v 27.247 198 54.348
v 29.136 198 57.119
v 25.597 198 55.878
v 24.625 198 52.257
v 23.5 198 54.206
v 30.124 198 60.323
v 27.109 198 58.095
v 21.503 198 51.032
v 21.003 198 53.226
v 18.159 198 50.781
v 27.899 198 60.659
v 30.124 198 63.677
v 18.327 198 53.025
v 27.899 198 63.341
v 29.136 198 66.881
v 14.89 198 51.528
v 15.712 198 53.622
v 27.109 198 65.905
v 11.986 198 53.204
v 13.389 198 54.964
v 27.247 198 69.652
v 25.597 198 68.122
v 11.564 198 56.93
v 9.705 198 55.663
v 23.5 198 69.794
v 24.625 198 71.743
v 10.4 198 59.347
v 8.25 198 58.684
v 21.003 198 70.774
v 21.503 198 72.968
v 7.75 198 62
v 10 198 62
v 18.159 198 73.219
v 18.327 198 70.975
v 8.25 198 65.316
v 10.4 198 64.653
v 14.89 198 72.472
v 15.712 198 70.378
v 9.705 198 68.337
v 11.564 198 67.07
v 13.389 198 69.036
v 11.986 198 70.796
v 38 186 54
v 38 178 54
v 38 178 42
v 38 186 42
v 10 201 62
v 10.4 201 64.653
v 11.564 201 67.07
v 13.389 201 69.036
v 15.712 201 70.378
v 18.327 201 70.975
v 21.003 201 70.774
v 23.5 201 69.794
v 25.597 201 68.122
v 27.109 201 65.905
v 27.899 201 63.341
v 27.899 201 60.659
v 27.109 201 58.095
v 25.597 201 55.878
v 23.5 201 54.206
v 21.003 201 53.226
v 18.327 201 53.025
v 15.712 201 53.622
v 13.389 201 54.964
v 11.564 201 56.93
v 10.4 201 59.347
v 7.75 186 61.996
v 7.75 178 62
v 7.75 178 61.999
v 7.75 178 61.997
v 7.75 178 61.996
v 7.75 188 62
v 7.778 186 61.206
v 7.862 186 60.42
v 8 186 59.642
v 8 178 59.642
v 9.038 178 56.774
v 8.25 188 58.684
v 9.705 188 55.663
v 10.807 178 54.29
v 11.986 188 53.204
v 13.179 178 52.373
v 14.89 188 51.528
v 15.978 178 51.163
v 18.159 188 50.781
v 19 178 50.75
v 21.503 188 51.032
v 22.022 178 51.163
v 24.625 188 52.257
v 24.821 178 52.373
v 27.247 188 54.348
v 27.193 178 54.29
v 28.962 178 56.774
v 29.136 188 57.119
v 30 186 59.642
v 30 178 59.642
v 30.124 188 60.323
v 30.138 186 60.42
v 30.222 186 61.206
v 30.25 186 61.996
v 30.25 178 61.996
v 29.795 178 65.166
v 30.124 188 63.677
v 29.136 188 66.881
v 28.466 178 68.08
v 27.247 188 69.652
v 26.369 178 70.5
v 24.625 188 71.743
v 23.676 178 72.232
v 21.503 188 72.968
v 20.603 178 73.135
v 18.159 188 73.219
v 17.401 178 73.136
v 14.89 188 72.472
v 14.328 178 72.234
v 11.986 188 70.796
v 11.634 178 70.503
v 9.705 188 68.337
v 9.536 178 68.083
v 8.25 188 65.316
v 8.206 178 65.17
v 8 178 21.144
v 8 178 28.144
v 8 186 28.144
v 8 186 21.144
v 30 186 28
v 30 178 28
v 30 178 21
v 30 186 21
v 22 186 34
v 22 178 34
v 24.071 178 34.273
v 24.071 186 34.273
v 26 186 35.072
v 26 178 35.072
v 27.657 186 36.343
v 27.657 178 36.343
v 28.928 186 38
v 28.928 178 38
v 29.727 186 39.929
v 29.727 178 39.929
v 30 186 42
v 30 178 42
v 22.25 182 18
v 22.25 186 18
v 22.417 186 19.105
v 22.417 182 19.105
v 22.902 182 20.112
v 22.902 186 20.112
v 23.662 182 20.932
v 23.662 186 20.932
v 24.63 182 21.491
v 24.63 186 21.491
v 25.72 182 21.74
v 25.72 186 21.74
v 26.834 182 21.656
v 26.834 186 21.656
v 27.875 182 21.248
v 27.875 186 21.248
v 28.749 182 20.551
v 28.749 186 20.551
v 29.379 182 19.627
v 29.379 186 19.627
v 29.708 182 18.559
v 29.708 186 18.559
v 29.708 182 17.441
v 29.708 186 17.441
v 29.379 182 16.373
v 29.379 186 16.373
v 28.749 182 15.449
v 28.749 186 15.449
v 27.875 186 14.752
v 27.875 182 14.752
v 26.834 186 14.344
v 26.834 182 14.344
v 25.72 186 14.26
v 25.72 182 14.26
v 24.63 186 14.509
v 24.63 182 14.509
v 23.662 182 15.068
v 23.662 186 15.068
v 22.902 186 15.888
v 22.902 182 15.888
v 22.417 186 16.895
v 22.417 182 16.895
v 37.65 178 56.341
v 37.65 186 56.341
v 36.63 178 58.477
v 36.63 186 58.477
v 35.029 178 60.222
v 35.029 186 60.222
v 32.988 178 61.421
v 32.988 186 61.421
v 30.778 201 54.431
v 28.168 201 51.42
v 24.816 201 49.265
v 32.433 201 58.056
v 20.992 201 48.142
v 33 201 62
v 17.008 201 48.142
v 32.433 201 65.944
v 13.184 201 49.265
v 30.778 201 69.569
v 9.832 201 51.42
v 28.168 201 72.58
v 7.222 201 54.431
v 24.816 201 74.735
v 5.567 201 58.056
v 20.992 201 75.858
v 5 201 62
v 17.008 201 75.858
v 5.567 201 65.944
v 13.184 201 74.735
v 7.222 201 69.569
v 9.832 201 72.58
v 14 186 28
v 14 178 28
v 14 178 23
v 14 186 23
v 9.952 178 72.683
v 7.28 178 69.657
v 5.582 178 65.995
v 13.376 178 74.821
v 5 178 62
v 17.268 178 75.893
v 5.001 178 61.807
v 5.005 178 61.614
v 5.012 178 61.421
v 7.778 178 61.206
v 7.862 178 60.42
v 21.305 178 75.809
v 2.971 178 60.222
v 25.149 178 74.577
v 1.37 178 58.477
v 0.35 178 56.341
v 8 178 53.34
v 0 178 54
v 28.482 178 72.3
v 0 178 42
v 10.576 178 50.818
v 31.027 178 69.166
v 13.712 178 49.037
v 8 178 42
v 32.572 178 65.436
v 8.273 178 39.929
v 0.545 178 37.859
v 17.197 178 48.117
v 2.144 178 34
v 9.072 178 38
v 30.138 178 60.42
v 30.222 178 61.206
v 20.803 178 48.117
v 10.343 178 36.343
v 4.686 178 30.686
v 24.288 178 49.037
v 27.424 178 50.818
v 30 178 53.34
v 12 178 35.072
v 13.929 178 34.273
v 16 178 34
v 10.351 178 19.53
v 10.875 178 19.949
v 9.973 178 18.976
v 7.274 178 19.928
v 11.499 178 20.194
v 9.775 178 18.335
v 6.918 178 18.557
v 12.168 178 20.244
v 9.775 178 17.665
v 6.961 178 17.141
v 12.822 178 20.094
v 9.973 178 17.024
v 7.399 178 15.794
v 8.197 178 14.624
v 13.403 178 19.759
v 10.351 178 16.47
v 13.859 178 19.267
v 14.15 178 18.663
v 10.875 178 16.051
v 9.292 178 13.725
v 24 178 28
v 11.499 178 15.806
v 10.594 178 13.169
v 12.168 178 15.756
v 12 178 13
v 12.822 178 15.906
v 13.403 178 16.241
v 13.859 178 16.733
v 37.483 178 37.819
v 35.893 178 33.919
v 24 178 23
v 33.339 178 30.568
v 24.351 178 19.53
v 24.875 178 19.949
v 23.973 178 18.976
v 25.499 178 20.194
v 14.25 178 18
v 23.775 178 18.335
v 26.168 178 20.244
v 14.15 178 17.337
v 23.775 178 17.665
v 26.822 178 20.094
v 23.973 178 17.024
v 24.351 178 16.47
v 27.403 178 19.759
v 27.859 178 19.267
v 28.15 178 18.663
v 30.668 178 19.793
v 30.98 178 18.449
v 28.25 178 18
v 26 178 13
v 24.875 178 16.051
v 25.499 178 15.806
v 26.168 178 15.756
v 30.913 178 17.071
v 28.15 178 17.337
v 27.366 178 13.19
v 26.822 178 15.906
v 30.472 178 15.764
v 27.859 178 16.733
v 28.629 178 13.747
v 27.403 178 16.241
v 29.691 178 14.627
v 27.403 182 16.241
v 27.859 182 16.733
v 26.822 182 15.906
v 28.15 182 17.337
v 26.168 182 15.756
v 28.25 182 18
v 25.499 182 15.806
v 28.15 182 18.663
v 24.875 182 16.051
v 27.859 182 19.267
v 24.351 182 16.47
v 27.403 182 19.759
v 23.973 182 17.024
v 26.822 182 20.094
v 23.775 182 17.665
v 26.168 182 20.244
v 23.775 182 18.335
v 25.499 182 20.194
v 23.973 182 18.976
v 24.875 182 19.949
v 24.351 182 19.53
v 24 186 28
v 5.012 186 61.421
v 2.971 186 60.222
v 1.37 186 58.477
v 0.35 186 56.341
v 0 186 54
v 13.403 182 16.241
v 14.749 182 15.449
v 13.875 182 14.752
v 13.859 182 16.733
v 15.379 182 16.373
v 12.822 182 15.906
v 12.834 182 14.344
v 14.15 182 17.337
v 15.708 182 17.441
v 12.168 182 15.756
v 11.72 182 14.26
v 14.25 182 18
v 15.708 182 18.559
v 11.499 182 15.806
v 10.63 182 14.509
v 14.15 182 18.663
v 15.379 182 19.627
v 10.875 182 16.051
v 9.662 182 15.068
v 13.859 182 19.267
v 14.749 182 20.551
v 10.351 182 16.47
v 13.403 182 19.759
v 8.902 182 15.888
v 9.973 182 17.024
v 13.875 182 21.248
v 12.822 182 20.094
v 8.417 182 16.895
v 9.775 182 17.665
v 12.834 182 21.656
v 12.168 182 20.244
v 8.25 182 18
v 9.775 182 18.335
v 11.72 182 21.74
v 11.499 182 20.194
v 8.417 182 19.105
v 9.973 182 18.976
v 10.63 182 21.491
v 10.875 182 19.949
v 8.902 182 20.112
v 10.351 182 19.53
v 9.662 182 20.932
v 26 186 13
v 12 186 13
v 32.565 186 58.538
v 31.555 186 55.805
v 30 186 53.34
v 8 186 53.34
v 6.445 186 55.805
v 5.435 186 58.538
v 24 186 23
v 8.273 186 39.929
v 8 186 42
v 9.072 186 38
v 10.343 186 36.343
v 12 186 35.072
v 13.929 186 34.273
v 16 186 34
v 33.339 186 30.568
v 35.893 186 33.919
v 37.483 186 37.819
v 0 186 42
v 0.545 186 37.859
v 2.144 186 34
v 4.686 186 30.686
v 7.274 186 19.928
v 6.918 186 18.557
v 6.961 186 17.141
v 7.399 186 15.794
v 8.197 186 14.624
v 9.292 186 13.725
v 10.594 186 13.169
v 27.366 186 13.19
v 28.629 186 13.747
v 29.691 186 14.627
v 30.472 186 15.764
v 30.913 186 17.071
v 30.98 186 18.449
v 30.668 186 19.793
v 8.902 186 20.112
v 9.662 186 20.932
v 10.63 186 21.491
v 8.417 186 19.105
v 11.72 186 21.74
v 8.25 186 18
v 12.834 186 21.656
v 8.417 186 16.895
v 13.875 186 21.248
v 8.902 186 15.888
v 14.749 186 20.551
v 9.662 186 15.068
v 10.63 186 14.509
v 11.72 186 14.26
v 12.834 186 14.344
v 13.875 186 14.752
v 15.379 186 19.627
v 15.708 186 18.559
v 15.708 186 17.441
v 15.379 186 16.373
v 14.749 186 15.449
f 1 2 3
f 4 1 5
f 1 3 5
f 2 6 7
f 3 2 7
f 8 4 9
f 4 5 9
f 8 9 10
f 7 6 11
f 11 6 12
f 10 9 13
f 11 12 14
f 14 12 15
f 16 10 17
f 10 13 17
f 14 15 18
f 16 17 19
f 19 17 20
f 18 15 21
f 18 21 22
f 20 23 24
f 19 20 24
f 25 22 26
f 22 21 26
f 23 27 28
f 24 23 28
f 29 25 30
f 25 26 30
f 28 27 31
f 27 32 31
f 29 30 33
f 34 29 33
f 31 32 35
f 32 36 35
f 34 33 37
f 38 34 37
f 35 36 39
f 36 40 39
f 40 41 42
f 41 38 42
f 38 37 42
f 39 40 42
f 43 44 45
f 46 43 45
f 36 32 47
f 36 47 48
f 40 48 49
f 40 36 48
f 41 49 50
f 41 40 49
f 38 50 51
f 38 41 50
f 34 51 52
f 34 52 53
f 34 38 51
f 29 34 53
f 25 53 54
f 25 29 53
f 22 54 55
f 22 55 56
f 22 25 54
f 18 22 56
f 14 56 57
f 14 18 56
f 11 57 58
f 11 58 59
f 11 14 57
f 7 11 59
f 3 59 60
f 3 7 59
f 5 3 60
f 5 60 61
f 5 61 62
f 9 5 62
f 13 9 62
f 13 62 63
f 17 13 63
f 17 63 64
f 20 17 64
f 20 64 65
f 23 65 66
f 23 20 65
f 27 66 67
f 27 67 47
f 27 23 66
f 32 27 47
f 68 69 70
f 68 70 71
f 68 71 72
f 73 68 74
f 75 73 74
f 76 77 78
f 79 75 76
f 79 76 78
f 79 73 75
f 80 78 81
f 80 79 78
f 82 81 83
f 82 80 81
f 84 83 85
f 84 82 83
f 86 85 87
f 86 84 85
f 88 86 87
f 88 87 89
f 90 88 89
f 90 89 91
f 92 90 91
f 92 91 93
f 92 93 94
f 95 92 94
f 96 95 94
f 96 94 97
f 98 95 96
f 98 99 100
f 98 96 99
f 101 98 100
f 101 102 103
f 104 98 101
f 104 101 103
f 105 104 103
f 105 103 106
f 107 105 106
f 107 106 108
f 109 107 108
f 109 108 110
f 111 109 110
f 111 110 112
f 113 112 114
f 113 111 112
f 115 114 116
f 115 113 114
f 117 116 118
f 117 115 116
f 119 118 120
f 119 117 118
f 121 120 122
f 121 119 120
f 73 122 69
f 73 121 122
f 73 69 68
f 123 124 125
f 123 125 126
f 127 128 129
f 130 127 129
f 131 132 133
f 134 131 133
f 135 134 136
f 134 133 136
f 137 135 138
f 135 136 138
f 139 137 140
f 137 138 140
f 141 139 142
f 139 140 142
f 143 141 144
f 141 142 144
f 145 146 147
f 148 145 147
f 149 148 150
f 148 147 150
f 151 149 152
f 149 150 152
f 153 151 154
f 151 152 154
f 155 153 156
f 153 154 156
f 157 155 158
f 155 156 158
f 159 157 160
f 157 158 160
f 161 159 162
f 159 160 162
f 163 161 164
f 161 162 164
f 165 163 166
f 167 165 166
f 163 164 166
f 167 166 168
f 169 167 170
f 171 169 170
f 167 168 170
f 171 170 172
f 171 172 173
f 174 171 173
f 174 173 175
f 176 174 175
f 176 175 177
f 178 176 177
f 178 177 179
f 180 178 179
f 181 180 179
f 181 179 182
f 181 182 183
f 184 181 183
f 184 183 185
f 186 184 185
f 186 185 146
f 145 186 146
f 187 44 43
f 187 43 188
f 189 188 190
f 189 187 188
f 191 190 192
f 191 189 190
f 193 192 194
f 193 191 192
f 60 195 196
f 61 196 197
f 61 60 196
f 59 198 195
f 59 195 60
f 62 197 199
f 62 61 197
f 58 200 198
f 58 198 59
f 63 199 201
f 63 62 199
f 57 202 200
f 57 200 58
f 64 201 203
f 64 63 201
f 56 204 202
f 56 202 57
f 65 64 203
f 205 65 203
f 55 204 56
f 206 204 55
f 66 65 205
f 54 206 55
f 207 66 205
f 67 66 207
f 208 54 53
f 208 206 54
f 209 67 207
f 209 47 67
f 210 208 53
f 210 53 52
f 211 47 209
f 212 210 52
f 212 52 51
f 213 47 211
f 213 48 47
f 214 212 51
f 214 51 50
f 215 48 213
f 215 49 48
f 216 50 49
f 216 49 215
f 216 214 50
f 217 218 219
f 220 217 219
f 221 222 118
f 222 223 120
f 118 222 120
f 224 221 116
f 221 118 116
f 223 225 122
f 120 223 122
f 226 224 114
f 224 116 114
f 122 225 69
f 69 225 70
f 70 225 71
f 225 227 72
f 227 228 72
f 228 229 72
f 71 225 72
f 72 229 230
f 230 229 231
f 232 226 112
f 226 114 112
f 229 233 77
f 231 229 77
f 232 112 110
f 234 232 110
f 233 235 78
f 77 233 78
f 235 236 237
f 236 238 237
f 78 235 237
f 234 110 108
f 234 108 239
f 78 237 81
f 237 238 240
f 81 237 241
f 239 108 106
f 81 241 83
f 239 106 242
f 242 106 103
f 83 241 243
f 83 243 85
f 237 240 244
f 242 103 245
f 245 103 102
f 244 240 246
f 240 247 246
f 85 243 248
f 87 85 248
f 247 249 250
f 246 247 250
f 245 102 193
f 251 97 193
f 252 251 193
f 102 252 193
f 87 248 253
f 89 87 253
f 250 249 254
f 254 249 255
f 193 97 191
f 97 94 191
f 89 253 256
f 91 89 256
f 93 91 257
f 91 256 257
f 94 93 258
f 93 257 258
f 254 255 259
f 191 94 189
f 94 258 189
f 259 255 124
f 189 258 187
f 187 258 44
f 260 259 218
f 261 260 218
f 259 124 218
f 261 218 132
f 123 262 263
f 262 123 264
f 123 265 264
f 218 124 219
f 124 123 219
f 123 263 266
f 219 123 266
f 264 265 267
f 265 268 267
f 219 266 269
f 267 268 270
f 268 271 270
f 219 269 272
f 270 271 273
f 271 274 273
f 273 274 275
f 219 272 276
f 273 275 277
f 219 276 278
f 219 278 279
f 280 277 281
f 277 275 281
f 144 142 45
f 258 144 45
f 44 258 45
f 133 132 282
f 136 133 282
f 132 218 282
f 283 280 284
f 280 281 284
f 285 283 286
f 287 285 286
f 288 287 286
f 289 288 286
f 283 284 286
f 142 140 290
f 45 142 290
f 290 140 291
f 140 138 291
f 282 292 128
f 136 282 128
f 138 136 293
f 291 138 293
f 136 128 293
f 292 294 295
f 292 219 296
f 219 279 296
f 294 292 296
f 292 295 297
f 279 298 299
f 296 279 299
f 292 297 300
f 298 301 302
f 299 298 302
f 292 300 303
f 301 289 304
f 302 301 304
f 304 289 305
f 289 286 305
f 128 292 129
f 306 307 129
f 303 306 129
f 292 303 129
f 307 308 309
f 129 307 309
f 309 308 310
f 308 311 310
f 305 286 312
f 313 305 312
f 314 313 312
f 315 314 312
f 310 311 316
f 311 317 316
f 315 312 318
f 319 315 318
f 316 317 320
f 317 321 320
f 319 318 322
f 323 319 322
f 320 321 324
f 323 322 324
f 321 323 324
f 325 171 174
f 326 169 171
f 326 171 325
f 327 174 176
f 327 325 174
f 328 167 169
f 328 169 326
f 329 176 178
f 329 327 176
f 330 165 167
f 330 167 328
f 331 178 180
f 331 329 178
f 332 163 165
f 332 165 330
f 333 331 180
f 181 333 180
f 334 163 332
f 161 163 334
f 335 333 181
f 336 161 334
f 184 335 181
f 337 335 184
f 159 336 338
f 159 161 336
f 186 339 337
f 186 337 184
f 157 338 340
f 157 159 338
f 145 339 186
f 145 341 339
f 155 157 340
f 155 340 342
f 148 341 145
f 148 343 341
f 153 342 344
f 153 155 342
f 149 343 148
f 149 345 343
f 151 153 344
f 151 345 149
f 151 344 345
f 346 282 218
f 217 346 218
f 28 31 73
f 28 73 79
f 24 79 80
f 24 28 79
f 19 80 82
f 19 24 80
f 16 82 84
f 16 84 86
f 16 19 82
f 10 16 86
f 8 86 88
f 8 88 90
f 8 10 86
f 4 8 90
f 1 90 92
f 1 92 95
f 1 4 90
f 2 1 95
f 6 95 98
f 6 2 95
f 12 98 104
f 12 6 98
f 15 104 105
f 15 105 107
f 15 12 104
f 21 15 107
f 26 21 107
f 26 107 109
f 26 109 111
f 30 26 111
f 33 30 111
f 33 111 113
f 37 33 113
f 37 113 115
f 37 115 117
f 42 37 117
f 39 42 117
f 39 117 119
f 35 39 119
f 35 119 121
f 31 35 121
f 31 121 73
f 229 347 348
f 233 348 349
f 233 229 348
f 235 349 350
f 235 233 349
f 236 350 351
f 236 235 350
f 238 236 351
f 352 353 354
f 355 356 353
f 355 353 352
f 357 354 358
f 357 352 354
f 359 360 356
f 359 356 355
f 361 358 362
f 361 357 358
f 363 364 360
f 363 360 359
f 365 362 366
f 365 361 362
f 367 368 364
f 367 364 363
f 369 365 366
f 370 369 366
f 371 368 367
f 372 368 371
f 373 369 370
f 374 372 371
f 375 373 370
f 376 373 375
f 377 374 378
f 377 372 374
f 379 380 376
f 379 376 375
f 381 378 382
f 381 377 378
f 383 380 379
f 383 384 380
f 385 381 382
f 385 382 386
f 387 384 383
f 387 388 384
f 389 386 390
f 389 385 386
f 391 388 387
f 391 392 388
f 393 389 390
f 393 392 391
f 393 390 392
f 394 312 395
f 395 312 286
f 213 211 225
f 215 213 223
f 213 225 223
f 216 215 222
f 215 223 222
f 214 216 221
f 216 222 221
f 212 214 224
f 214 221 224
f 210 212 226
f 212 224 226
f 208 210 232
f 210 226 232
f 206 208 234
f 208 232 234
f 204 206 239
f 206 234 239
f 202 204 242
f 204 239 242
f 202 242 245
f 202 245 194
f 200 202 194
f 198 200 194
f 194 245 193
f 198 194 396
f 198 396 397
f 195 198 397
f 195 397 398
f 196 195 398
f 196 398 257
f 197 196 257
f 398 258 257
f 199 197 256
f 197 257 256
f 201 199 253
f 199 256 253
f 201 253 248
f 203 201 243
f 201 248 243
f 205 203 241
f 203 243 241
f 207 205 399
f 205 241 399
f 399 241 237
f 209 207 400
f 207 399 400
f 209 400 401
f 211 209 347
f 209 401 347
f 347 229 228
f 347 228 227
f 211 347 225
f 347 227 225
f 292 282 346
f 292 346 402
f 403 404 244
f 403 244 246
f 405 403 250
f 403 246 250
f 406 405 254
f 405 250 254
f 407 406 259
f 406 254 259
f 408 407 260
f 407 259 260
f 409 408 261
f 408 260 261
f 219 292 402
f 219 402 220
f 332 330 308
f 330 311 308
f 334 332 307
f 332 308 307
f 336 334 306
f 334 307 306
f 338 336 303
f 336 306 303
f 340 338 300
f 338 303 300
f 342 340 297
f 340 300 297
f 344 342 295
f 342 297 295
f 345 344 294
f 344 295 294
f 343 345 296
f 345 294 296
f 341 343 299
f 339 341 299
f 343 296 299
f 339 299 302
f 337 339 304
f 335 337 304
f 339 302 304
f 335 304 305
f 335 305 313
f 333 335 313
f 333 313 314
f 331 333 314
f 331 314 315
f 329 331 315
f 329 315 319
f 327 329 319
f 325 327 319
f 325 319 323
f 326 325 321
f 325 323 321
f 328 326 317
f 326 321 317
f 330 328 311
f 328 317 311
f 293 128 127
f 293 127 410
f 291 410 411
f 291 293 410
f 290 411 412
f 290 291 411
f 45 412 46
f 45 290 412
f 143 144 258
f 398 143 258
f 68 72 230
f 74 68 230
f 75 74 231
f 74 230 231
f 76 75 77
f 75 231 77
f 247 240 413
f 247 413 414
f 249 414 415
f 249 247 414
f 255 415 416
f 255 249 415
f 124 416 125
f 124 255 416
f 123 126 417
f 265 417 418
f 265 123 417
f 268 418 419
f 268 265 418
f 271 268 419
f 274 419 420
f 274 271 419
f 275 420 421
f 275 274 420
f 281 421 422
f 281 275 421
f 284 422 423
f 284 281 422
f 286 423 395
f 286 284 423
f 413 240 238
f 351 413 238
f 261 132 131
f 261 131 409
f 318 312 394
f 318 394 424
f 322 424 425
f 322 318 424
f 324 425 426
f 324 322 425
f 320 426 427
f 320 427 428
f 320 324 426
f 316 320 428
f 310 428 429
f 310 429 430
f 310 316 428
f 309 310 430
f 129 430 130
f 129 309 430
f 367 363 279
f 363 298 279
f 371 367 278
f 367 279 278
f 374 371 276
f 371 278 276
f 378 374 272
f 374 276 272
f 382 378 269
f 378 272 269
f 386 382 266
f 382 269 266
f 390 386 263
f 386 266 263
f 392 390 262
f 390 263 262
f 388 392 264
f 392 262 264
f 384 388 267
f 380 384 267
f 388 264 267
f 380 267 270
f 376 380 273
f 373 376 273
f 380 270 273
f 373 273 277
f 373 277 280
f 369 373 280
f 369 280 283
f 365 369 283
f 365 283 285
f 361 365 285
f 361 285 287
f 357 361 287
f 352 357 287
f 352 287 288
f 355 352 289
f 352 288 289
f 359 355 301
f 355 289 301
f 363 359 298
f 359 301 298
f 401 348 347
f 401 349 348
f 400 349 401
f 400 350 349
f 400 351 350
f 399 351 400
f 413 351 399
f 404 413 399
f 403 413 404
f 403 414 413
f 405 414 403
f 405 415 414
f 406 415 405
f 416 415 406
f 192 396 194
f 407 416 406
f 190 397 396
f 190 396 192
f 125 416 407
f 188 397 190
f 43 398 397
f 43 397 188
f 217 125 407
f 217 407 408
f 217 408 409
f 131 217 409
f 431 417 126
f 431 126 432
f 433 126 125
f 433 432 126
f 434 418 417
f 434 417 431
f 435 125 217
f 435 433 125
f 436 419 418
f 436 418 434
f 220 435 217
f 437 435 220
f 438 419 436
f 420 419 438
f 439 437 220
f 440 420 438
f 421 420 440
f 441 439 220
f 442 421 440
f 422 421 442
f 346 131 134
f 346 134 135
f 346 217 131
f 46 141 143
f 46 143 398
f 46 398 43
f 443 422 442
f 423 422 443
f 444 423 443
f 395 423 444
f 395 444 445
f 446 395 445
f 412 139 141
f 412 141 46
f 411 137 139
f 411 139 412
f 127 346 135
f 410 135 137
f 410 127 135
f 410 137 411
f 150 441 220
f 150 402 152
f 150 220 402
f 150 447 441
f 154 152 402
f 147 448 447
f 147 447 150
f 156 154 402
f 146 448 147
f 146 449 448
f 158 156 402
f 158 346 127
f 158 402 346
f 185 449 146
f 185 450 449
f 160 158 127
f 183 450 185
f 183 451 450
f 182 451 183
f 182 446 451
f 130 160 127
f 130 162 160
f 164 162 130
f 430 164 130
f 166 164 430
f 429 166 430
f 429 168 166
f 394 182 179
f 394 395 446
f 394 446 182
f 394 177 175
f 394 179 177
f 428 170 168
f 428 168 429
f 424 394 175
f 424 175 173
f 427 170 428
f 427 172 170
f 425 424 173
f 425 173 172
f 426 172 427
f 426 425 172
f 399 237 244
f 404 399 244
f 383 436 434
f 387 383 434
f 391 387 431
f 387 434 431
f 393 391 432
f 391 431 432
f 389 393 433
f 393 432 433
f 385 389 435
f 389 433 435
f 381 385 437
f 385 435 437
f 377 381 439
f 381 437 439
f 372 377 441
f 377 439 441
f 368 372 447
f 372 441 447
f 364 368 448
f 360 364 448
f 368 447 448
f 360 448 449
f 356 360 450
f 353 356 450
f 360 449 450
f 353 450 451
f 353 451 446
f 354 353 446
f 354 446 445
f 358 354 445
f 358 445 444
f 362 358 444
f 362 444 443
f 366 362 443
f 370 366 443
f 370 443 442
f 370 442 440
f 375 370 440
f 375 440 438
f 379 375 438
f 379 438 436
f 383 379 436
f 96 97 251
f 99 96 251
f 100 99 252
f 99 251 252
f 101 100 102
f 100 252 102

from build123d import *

# Parameters (mm, degrees)
SKETCH005_R             = 14
SKETCH005_R_2           = 11.25
PAD005_DEPTH            = 20
SKETCH006_R             = 14
SKETCH006_R_2           = 9
PAD006_DEPTH            = 3
SKETCH007_W             = 10
SKETCH007_H             = 5
PAD007_DEPTH            = 8
HOLE_D                  = 4.5
HOLE_DEPTH              = 25
HOLE_CBORE_D            = 7.5
HOLE_CBORE_DEPTH        = 4
SKETCH032_R             = 11.25
POCKET002_DEPTH         = 10
BODY002_PLACEMENT_ANGLE = 180


with BuildPart() as part:
    # Sketch005 → Pad005 (new body)
    with BuildSketch(Plane.XZ):
        Circle(SKETCH005_R)
        Circle(SKETCH005_R_2, mode=Mode.SUBTRACT)
    extrude(amount=PAD005_DEPTH)

    # Sketch006 (on Face3 of Pad005) → Pad006 (join)
    with BuildSketch(Plane(origin=(0, 0, 0), x_dir=(1, 0, 0), z_dir=(0, 1, 0))):
        Circle(SKETCH006_R)
        Circle(SKETCH006_R_2, mode=Mode.SUBTRACT)
    extrude(amount=PAD006_DEPTH)

    # Sketch007 (on Face3 of Pad006) → Pad007 (join)
    with BuildSketch(Plane.XZ.offset(20)):
        with BuildLine():
            Line((-11, 20), (-11, 0))
            ThreePointArc((-19, 8), (-16.656854, 2.343146), (-11, 0))
            Line((-19, 8), (-19, 20))
            ThreePointArc((-11, 34), (-16.892531, 28.081446), (-19, 20))
            Line((-11, 34), (-11, 41))
            ThreePointArc((-7, 49), (-11.472136, 46.236068), (-11, 41))
            Line((-7, 49), (7, 49))
            ThreePointArc((11, 40.856406), (11.600717, 46.205633), (7, 49))
            Line((11, 33.856406), (11, 40.856406))
            ThreePointArc((19, 20), (16.856406, 28), (11, 33.856406))
            Line((19, 20), (19, 8))
            ThreePointArc((11, 0), (16.656854, 2.343146), (19, 8))
            Line((11, 0), (11, 20))
            ThreePointArc((11, 20), (8.656855, 25.656854), (3.000001, 28))
            Line((-2.999999, 28), (3.000001, 28))
            ThreePointArc((-2.999999, 28), (-8.656854, 25.656855), (-11, 20))
        make_face()
        with Locations((0, 36.5)):
            Rectangle(SKETCH007_W, SKETCH007_H, mode=Mode.SUBTRACT)
    extrude(amount=-PAD007_DEPTH)

    # Hole
    with Locations(Plane(origin=(0, -12, 0), x_dir=(1, 0, 0), z_dir=(0, 1, 0))):
        with Locations((-7, -44), (7, -44)):
            CounterBoreHole(HOLE_D / 2, HOLE_CBORE_D / 2, HOLE_CBORE_DEPTH, depth=HOLE_DEPTH)

    # Sketch032 (on Face7 of Hole) → Pocket002 (cut)
    with BuildSketch(Plane.XZ.offset(20)):
        Circle(SKETCH032_R)
    extrude(amount=-POCKET002_DEPTH, mode=Mode.SUBTRACT)


with BuildPart() as part_1:
    # Body002 placement: moved
    add(part.part.moved(Location((19, 198, 62))).rotate(Axis((19, 198, 62), (0, 1, 0)), BODY002_PLACEMENT_ANGLE))


solid = part_1.part
